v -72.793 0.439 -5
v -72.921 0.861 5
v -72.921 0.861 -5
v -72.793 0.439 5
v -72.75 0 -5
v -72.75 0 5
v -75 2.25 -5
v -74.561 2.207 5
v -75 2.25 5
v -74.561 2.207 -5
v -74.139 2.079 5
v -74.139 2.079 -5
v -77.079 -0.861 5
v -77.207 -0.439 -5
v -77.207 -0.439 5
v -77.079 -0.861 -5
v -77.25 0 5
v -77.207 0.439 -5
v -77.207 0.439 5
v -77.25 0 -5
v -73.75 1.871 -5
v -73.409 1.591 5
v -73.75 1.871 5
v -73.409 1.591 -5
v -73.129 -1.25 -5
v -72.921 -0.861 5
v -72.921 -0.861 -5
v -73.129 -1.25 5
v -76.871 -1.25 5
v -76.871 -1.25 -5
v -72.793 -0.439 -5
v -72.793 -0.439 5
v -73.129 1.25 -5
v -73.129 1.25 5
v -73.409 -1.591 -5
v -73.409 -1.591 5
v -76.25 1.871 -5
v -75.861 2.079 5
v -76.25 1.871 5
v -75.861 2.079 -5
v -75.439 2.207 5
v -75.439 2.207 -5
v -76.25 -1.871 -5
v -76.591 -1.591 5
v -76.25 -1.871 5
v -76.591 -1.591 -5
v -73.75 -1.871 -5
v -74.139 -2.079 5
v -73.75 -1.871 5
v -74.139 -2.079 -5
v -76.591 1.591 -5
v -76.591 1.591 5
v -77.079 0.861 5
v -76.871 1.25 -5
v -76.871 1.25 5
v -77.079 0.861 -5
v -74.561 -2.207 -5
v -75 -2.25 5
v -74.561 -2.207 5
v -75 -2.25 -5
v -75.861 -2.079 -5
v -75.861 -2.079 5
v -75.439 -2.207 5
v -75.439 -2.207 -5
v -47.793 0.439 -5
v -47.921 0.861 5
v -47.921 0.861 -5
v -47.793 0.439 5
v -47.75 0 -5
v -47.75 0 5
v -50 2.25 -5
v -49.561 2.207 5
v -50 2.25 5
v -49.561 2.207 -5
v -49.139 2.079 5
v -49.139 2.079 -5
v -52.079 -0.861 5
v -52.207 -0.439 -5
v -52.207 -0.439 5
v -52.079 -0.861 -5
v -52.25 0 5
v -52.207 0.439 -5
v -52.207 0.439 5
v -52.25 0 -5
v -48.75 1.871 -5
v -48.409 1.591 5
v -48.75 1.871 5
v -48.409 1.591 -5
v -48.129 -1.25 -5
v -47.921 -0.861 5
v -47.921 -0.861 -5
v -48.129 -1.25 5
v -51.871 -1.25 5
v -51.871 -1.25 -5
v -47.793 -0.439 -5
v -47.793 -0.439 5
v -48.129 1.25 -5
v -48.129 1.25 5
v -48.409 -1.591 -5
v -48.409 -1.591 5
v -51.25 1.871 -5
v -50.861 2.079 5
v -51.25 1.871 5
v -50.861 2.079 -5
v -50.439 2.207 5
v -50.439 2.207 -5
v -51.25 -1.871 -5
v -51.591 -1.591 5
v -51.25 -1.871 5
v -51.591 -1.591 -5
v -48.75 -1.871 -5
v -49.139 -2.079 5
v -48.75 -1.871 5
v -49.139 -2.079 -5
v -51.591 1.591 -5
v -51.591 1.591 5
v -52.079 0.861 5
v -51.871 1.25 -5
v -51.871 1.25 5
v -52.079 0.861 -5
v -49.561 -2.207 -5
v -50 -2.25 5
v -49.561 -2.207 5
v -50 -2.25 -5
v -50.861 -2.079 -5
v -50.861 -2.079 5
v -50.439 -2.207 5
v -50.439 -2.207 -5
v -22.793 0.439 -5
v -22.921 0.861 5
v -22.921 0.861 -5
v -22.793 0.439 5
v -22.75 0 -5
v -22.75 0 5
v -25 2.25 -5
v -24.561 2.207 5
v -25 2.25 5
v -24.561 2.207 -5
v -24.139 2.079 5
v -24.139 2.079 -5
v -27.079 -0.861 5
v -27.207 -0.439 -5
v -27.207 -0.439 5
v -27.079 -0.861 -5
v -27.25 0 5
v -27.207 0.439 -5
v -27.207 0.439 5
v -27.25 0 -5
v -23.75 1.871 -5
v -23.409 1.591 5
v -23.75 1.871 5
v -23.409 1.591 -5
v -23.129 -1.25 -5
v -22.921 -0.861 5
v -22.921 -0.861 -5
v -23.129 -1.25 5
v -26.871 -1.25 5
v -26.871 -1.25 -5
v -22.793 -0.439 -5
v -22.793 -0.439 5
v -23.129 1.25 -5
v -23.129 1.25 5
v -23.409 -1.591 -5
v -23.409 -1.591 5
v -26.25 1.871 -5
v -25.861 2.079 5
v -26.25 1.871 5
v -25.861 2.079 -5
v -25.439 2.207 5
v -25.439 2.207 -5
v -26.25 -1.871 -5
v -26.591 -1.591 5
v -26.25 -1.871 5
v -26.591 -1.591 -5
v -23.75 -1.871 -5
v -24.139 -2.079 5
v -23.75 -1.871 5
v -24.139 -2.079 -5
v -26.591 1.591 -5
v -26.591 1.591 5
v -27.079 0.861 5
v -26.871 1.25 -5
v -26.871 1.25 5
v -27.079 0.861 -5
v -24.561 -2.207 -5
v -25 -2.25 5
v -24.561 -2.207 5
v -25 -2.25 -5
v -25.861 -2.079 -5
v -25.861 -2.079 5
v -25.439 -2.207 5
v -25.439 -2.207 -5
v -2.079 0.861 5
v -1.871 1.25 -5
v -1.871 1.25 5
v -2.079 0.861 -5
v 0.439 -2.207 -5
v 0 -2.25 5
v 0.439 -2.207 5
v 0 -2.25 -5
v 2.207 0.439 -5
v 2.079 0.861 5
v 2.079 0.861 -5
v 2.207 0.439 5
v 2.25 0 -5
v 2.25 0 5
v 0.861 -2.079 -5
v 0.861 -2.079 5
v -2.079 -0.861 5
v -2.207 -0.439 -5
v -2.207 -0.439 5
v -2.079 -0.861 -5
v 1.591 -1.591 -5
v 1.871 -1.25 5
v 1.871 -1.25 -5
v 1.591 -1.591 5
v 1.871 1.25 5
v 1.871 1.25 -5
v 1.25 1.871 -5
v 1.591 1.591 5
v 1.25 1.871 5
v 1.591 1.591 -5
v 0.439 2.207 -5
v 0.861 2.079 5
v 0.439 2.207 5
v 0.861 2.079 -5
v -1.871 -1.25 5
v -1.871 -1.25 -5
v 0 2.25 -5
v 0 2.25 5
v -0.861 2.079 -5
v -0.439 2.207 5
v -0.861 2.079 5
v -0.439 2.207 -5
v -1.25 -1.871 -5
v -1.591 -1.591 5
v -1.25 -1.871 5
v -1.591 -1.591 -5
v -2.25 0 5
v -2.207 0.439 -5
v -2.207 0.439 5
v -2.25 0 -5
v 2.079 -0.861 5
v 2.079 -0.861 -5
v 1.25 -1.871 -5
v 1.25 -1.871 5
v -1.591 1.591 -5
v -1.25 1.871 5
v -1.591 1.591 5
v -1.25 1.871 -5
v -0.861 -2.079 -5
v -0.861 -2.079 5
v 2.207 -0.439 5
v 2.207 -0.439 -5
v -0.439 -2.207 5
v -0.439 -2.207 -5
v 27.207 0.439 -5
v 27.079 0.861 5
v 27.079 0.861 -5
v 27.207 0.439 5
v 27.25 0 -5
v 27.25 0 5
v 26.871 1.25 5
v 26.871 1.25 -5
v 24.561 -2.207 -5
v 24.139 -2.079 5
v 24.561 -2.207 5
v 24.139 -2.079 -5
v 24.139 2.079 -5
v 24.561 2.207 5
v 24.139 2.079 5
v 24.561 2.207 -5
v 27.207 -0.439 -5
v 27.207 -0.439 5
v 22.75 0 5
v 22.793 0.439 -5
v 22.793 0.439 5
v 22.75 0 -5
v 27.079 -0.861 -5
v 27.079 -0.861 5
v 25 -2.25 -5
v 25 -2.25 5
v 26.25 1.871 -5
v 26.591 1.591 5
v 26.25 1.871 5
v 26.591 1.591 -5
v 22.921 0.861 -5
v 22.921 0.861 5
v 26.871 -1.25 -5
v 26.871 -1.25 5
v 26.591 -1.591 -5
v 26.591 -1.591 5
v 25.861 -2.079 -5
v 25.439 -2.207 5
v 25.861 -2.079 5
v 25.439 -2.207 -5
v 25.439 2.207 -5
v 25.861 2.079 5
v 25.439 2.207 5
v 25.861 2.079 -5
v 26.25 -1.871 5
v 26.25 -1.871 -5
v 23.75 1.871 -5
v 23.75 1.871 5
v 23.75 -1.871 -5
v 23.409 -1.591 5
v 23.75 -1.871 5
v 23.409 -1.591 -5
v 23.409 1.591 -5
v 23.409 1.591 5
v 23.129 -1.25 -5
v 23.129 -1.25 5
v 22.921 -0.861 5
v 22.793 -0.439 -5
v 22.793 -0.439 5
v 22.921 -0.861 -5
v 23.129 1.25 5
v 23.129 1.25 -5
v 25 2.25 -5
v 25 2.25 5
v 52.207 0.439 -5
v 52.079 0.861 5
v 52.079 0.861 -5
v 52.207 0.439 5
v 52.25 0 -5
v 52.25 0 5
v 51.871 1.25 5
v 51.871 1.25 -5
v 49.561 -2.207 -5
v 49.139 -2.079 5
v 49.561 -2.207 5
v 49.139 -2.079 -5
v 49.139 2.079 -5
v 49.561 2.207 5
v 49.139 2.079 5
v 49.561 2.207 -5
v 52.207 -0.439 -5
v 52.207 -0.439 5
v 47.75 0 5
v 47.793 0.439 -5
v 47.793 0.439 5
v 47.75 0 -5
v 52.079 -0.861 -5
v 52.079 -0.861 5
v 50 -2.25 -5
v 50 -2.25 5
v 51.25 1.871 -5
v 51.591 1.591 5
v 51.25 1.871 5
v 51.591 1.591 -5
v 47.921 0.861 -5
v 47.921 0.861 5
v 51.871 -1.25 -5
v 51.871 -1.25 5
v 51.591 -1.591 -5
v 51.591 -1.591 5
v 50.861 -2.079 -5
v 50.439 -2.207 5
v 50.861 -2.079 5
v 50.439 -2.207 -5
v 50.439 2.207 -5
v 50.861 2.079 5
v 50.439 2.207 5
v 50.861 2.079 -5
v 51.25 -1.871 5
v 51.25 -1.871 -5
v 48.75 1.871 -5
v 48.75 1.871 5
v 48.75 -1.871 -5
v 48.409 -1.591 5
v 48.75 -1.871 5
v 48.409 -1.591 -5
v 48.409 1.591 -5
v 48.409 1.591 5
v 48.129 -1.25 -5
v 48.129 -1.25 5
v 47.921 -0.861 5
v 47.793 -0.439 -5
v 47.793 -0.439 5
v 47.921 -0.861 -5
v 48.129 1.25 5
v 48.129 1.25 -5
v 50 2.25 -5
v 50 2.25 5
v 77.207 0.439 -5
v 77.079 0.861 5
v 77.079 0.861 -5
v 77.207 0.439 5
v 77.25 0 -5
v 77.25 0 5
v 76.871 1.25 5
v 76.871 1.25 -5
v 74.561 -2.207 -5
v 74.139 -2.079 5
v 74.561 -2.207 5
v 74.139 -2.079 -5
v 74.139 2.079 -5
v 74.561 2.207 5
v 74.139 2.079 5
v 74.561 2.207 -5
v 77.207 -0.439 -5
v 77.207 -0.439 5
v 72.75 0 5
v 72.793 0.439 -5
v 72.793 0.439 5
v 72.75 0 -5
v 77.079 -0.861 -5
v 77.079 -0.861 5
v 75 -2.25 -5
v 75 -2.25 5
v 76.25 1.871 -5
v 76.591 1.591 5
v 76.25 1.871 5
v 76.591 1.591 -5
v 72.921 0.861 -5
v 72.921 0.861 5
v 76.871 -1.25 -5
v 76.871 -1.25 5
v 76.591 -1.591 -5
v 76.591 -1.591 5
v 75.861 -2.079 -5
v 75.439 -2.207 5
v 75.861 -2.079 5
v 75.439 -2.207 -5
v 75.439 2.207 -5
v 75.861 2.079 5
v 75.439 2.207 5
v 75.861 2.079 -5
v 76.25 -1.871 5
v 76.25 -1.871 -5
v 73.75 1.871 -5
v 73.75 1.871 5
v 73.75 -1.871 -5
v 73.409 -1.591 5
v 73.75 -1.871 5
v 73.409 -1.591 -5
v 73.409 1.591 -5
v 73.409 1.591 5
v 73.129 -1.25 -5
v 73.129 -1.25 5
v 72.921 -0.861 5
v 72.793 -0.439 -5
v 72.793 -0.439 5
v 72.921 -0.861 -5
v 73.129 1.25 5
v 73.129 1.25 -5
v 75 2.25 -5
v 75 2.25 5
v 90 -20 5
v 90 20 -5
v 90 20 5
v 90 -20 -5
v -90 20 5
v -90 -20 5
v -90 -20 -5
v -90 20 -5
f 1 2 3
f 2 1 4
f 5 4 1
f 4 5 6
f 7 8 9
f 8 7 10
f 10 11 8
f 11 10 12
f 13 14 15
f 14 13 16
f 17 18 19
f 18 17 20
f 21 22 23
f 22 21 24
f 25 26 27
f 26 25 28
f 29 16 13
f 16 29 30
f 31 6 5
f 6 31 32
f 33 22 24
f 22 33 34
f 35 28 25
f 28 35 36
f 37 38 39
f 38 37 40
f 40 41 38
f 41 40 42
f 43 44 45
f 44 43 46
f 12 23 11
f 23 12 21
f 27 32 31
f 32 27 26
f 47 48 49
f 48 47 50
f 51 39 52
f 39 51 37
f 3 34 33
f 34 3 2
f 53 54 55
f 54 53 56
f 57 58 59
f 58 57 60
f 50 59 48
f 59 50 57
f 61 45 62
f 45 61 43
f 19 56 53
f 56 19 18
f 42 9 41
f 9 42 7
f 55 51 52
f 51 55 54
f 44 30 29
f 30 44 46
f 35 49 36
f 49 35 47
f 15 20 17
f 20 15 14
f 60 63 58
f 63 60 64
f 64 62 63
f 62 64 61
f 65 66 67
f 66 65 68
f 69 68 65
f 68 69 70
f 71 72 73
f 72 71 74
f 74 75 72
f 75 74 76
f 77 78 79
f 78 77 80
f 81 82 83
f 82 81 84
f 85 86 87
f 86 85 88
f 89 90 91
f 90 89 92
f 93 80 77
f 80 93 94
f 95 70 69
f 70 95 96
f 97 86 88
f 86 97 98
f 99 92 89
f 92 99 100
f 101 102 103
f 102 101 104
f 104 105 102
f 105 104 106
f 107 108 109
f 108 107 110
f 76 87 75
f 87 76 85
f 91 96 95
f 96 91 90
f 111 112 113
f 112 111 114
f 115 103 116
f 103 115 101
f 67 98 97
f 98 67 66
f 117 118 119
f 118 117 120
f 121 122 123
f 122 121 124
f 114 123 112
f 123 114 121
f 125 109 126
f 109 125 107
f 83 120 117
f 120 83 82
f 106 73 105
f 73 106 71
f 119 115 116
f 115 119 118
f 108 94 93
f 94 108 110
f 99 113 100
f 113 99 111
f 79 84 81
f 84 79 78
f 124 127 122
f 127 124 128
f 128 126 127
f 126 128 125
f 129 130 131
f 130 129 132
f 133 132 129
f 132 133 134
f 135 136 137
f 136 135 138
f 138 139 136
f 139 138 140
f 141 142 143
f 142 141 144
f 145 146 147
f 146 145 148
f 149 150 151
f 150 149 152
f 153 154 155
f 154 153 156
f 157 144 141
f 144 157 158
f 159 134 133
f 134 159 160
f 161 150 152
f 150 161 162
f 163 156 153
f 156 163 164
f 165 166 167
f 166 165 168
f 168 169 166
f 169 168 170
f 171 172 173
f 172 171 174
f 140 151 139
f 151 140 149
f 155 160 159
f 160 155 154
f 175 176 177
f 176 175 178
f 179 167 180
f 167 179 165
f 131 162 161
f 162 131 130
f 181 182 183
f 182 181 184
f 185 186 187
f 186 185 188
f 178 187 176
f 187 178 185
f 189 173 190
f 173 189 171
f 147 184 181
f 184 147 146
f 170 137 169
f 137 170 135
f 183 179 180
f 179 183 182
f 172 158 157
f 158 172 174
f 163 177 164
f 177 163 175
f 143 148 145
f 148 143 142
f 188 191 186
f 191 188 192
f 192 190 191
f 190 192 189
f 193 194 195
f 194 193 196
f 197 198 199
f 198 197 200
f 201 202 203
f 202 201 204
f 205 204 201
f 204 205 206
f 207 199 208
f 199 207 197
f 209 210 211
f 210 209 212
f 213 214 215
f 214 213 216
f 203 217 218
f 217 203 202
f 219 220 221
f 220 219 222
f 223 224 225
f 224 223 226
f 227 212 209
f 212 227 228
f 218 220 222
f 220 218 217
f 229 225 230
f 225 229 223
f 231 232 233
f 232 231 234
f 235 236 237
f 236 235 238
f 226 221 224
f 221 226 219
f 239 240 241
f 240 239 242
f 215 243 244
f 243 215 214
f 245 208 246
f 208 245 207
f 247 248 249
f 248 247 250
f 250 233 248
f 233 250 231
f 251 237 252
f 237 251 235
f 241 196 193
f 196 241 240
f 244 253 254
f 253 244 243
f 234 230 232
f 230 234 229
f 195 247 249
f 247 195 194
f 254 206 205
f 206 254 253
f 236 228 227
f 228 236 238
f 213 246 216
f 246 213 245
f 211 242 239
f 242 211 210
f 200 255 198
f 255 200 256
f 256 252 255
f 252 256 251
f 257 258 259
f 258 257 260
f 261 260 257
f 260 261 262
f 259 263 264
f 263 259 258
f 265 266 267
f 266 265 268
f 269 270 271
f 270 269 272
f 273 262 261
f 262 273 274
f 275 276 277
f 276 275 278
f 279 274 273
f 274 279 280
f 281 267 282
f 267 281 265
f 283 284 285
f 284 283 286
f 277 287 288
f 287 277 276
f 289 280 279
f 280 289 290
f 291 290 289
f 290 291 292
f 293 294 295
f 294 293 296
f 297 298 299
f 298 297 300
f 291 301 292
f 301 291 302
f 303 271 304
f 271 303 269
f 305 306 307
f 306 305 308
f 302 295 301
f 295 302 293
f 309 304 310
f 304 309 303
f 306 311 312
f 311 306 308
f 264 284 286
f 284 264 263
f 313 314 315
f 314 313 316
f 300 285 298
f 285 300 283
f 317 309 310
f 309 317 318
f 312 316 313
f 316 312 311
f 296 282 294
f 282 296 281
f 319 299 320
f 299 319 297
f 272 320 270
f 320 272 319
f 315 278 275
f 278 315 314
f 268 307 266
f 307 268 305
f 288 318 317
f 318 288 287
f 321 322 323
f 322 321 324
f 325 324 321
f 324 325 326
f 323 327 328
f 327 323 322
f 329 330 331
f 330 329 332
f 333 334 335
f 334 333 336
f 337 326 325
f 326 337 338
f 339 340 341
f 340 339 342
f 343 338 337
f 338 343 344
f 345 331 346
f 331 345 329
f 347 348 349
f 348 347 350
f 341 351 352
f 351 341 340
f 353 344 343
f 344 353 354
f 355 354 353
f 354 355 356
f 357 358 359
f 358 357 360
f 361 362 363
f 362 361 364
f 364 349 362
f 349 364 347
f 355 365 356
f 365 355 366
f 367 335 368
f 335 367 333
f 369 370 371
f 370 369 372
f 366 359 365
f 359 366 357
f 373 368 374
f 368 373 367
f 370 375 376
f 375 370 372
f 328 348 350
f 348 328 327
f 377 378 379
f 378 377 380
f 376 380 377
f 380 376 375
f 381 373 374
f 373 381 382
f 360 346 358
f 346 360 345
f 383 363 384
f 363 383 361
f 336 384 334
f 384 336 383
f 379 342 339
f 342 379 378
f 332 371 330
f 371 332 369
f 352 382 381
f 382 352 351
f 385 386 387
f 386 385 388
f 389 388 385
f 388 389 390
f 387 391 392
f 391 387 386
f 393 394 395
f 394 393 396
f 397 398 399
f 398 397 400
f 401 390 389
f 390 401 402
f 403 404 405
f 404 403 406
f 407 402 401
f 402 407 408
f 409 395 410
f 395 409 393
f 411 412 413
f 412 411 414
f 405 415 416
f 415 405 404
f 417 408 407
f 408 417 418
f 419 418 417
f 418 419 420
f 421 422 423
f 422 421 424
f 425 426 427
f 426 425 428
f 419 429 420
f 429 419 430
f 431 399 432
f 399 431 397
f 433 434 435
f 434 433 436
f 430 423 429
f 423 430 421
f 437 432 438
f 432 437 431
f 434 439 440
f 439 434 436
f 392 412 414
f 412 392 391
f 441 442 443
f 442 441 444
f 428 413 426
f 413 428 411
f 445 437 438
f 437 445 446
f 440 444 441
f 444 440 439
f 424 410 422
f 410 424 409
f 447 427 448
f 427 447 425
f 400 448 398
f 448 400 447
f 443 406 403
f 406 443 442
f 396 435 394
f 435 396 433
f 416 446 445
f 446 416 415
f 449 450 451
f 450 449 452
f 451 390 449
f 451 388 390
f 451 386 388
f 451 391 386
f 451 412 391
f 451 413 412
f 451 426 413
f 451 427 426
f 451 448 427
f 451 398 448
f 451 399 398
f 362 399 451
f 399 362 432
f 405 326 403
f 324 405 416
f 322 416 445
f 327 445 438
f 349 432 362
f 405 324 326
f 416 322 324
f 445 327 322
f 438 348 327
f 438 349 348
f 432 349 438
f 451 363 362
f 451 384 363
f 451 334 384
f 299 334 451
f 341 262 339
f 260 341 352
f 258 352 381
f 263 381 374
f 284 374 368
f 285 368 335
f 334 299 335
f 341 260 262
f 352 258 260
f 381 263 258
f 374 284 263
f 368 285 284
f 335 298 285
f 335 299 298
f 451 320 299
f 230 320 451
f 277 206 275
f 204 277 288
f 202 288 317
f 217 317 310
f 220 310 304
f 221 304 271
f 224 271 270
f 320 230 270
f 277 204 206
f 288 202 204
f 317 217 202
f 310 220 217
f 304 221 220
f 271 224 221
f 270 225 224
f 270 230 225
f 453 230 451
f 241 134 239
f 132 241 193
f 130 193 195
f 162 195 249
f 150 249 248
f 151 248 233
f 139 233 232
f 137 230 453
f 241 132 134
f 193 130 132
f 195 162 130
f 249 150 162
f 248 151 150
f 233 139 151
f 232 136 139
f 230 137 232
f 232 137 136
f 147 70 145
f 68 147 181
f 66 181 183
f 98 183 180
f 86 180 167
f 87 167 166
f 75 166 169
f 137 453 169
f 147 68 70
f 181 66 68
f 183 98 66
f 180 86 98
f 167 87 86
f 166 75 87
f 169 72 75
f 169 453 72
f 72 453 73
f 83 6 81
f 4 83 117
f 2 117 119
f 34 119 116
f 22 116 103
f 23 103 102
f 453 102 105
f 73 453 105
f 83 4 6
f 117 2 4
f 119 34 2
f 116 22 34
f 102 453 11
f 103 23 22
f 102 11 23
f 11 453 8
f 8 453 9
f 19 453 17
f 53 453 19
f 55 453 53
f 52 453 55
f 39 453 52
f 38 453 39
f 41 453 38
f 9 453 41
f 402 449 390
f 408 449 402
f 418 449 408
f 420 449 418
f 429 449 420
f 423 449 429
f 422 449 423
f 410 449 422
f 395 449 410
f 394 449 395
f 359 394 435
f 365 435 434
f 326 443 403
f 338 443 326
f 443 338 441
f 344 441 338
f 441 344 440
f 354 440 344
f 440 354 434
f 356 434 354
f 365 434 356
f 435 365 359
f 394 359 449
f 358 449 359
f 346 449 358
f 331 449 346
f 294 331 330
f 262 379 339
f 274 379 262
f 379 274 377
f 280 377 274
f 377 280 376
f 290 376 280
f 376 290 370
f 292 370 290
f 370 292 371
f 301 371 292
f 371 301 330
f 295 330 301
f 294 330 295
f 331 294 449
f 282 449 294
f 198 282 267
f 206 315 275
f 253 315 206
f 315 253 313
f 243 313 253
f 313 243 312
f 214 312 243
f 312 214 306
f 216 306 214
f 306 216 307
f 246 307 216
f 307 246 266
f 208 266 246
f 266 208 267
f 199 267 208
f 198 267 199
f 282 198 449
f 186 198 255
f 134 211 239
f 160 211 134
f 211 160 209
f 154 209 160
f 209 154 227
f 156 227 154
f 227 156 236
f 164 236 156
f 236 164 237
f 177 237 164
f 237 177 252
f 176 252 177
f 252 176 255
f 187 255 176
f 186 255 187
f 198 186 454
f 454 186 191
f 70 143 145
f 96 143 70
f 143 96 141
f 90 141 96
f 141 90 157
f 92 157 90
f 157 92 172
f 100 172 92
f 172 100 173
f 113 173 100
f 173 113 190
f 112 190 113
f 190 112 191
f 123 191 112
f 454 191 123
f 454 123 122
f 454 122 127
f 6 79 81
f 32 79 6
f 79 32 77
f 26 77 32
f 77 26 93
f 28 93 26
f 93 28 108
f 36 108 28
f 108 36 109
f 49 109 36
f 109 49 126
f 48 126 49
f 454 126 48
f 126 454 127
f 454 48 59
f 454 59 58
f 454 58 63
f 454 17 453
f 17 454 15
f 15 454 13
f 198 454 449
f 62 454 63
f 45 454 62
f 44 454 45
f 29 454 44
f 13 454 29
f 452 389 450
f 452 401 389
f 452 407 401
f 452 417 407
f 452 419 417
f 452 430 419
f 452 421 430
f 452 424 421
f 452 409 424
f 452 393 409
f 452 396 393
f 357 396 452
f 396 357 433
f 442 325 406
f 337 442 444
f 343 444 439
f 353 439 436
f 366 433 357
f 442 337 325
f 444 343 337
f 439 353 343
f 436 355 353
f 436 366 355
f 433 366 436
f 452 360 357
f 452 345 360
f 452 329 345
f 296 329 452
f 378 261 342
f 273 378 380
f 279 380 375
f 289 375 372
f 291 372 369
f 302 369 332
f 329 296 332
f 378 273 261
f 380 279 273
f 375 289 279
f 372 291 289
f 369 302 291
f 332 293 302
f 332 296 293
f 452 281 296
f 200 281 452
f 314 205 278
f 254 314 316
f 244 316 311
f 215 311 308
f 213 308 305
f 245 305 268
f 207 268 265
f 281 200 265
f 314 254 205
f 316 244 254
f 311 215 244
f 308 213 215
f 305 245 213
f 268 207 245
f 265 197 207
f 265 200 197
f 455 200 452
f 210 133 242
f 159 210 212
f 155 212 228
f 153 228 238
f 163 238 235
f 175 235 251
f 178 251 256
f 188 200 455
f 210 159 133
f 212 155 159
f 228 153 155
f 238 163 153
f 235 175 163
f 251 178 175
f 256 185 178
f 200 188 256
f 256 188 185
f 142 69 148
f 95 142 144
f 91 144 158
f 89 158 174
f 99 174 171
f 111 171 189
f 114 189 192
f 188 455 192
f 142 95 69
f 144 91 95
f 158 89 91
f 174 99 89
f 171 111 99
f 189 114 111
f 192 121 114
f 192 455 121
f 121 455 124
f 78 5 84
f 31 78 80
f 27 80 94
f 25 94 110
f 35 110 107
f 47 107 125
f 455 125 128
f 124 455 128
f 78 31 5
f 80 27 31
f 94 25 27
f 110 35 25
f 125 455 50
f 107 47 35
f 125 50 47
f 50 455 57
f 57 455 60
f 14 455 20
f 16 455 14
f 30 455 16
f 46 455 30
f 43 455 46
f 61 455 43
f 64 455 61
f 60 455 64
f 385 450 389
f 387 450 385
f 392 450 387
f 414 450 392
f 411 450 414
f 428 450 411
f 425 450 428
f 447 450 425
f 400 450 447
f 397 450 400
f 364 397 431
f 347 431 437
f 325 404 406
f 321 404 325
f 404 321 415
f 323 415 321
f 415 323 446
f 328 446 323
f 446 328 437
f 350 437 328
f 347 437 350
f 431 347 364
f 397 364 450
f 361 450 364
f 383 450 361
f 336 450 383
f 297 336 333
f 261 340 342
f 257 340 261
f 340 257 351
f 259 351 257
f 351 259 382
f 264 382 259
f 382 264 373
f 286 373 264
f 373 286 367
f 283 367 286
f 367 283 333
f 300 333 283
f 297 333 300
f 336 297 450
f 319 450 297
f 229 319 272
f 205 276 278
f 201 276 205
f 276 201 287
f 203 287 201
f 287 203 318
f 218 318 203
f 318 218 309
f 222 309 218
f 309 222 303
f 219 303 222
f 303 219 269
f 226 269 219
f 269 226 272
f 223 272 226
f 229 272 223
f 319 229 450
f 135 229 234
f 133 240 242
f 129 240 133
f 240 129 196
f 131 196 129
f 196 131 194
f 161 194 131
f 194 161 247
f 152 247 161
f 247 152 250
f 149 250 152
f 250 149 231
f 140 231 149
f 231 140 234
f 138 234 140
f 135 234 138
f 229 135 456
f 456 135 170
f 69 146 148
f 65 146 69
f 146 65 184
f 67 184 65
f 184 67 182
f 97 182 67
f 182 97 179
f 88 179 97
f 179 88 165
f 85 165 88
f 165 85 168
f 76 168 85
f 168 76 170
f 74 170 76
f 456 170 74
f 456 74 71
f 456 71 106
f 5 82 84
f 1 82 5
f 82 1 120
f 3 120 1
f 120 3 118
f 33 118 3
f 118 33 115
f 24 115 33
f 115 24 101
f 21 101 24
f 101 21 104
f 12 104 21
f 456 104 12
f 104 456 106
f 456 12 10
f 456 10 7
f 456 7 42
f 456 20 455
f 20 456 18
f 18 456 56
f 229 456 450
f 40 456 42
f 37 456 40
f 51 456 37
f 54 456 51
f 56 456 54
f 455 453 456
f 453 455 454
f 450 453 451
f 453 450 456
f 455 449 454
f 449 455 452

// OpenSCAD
$fn = 32;

// ----------------------------------------------------------------------
// Hole bar, 7 x Ø4.5
// skip layout, 15 mm edge offset
// ----------------------------------------------------------------------

// --- parameters (mm) ---
bar_w = 40;         // bar width (Y)
bar_t = 10;         // bar thickness (Z)
holes = 7;          // holes per row
hole_d = 4.5;       // hole diameter
edge = 15;          // offset from the bar end to the first hole
grid_pitch = 12.5;  // grid the bar was laid out on

// --- derived feature positions (mm) ---
pitch = grid_pitch * 2;       // = 25   holes sit every other grid slot
span = (holes - 1) * pitch;   // = 150   distance between the end holes
bar_l = span + 2 * edge;      // = 180   overall bar length
start_x = -bar_l / 2 + edge;  // = -75   X of the first hole
feature_centers = [
  [start_x + 0 * pitch, 0],
  [start_x + 1 * pitch, 0],
  [start_x + 2 * pitch, 0],
  [start_x + 3 * pitch, 0],
  [start_x + 4 * pitch, 0],
  [start_x + 5 * pitch, 0],
  [start_x + 6 * pitch, 0]
];   // hole centres of the first row

// bar with one row of holes, drilled from feature_centers
difference() {
  translate([-bar_l / 2, -bar_w / 2, -bar_t / 2]) cube([bar_l, bar_w, bar_t]);
  for (centre = feature_centers)
    translate([centre[0], centre[1], 0])
      cylinder(d = hole_d, h = bar_t + 2, center = true);
}
